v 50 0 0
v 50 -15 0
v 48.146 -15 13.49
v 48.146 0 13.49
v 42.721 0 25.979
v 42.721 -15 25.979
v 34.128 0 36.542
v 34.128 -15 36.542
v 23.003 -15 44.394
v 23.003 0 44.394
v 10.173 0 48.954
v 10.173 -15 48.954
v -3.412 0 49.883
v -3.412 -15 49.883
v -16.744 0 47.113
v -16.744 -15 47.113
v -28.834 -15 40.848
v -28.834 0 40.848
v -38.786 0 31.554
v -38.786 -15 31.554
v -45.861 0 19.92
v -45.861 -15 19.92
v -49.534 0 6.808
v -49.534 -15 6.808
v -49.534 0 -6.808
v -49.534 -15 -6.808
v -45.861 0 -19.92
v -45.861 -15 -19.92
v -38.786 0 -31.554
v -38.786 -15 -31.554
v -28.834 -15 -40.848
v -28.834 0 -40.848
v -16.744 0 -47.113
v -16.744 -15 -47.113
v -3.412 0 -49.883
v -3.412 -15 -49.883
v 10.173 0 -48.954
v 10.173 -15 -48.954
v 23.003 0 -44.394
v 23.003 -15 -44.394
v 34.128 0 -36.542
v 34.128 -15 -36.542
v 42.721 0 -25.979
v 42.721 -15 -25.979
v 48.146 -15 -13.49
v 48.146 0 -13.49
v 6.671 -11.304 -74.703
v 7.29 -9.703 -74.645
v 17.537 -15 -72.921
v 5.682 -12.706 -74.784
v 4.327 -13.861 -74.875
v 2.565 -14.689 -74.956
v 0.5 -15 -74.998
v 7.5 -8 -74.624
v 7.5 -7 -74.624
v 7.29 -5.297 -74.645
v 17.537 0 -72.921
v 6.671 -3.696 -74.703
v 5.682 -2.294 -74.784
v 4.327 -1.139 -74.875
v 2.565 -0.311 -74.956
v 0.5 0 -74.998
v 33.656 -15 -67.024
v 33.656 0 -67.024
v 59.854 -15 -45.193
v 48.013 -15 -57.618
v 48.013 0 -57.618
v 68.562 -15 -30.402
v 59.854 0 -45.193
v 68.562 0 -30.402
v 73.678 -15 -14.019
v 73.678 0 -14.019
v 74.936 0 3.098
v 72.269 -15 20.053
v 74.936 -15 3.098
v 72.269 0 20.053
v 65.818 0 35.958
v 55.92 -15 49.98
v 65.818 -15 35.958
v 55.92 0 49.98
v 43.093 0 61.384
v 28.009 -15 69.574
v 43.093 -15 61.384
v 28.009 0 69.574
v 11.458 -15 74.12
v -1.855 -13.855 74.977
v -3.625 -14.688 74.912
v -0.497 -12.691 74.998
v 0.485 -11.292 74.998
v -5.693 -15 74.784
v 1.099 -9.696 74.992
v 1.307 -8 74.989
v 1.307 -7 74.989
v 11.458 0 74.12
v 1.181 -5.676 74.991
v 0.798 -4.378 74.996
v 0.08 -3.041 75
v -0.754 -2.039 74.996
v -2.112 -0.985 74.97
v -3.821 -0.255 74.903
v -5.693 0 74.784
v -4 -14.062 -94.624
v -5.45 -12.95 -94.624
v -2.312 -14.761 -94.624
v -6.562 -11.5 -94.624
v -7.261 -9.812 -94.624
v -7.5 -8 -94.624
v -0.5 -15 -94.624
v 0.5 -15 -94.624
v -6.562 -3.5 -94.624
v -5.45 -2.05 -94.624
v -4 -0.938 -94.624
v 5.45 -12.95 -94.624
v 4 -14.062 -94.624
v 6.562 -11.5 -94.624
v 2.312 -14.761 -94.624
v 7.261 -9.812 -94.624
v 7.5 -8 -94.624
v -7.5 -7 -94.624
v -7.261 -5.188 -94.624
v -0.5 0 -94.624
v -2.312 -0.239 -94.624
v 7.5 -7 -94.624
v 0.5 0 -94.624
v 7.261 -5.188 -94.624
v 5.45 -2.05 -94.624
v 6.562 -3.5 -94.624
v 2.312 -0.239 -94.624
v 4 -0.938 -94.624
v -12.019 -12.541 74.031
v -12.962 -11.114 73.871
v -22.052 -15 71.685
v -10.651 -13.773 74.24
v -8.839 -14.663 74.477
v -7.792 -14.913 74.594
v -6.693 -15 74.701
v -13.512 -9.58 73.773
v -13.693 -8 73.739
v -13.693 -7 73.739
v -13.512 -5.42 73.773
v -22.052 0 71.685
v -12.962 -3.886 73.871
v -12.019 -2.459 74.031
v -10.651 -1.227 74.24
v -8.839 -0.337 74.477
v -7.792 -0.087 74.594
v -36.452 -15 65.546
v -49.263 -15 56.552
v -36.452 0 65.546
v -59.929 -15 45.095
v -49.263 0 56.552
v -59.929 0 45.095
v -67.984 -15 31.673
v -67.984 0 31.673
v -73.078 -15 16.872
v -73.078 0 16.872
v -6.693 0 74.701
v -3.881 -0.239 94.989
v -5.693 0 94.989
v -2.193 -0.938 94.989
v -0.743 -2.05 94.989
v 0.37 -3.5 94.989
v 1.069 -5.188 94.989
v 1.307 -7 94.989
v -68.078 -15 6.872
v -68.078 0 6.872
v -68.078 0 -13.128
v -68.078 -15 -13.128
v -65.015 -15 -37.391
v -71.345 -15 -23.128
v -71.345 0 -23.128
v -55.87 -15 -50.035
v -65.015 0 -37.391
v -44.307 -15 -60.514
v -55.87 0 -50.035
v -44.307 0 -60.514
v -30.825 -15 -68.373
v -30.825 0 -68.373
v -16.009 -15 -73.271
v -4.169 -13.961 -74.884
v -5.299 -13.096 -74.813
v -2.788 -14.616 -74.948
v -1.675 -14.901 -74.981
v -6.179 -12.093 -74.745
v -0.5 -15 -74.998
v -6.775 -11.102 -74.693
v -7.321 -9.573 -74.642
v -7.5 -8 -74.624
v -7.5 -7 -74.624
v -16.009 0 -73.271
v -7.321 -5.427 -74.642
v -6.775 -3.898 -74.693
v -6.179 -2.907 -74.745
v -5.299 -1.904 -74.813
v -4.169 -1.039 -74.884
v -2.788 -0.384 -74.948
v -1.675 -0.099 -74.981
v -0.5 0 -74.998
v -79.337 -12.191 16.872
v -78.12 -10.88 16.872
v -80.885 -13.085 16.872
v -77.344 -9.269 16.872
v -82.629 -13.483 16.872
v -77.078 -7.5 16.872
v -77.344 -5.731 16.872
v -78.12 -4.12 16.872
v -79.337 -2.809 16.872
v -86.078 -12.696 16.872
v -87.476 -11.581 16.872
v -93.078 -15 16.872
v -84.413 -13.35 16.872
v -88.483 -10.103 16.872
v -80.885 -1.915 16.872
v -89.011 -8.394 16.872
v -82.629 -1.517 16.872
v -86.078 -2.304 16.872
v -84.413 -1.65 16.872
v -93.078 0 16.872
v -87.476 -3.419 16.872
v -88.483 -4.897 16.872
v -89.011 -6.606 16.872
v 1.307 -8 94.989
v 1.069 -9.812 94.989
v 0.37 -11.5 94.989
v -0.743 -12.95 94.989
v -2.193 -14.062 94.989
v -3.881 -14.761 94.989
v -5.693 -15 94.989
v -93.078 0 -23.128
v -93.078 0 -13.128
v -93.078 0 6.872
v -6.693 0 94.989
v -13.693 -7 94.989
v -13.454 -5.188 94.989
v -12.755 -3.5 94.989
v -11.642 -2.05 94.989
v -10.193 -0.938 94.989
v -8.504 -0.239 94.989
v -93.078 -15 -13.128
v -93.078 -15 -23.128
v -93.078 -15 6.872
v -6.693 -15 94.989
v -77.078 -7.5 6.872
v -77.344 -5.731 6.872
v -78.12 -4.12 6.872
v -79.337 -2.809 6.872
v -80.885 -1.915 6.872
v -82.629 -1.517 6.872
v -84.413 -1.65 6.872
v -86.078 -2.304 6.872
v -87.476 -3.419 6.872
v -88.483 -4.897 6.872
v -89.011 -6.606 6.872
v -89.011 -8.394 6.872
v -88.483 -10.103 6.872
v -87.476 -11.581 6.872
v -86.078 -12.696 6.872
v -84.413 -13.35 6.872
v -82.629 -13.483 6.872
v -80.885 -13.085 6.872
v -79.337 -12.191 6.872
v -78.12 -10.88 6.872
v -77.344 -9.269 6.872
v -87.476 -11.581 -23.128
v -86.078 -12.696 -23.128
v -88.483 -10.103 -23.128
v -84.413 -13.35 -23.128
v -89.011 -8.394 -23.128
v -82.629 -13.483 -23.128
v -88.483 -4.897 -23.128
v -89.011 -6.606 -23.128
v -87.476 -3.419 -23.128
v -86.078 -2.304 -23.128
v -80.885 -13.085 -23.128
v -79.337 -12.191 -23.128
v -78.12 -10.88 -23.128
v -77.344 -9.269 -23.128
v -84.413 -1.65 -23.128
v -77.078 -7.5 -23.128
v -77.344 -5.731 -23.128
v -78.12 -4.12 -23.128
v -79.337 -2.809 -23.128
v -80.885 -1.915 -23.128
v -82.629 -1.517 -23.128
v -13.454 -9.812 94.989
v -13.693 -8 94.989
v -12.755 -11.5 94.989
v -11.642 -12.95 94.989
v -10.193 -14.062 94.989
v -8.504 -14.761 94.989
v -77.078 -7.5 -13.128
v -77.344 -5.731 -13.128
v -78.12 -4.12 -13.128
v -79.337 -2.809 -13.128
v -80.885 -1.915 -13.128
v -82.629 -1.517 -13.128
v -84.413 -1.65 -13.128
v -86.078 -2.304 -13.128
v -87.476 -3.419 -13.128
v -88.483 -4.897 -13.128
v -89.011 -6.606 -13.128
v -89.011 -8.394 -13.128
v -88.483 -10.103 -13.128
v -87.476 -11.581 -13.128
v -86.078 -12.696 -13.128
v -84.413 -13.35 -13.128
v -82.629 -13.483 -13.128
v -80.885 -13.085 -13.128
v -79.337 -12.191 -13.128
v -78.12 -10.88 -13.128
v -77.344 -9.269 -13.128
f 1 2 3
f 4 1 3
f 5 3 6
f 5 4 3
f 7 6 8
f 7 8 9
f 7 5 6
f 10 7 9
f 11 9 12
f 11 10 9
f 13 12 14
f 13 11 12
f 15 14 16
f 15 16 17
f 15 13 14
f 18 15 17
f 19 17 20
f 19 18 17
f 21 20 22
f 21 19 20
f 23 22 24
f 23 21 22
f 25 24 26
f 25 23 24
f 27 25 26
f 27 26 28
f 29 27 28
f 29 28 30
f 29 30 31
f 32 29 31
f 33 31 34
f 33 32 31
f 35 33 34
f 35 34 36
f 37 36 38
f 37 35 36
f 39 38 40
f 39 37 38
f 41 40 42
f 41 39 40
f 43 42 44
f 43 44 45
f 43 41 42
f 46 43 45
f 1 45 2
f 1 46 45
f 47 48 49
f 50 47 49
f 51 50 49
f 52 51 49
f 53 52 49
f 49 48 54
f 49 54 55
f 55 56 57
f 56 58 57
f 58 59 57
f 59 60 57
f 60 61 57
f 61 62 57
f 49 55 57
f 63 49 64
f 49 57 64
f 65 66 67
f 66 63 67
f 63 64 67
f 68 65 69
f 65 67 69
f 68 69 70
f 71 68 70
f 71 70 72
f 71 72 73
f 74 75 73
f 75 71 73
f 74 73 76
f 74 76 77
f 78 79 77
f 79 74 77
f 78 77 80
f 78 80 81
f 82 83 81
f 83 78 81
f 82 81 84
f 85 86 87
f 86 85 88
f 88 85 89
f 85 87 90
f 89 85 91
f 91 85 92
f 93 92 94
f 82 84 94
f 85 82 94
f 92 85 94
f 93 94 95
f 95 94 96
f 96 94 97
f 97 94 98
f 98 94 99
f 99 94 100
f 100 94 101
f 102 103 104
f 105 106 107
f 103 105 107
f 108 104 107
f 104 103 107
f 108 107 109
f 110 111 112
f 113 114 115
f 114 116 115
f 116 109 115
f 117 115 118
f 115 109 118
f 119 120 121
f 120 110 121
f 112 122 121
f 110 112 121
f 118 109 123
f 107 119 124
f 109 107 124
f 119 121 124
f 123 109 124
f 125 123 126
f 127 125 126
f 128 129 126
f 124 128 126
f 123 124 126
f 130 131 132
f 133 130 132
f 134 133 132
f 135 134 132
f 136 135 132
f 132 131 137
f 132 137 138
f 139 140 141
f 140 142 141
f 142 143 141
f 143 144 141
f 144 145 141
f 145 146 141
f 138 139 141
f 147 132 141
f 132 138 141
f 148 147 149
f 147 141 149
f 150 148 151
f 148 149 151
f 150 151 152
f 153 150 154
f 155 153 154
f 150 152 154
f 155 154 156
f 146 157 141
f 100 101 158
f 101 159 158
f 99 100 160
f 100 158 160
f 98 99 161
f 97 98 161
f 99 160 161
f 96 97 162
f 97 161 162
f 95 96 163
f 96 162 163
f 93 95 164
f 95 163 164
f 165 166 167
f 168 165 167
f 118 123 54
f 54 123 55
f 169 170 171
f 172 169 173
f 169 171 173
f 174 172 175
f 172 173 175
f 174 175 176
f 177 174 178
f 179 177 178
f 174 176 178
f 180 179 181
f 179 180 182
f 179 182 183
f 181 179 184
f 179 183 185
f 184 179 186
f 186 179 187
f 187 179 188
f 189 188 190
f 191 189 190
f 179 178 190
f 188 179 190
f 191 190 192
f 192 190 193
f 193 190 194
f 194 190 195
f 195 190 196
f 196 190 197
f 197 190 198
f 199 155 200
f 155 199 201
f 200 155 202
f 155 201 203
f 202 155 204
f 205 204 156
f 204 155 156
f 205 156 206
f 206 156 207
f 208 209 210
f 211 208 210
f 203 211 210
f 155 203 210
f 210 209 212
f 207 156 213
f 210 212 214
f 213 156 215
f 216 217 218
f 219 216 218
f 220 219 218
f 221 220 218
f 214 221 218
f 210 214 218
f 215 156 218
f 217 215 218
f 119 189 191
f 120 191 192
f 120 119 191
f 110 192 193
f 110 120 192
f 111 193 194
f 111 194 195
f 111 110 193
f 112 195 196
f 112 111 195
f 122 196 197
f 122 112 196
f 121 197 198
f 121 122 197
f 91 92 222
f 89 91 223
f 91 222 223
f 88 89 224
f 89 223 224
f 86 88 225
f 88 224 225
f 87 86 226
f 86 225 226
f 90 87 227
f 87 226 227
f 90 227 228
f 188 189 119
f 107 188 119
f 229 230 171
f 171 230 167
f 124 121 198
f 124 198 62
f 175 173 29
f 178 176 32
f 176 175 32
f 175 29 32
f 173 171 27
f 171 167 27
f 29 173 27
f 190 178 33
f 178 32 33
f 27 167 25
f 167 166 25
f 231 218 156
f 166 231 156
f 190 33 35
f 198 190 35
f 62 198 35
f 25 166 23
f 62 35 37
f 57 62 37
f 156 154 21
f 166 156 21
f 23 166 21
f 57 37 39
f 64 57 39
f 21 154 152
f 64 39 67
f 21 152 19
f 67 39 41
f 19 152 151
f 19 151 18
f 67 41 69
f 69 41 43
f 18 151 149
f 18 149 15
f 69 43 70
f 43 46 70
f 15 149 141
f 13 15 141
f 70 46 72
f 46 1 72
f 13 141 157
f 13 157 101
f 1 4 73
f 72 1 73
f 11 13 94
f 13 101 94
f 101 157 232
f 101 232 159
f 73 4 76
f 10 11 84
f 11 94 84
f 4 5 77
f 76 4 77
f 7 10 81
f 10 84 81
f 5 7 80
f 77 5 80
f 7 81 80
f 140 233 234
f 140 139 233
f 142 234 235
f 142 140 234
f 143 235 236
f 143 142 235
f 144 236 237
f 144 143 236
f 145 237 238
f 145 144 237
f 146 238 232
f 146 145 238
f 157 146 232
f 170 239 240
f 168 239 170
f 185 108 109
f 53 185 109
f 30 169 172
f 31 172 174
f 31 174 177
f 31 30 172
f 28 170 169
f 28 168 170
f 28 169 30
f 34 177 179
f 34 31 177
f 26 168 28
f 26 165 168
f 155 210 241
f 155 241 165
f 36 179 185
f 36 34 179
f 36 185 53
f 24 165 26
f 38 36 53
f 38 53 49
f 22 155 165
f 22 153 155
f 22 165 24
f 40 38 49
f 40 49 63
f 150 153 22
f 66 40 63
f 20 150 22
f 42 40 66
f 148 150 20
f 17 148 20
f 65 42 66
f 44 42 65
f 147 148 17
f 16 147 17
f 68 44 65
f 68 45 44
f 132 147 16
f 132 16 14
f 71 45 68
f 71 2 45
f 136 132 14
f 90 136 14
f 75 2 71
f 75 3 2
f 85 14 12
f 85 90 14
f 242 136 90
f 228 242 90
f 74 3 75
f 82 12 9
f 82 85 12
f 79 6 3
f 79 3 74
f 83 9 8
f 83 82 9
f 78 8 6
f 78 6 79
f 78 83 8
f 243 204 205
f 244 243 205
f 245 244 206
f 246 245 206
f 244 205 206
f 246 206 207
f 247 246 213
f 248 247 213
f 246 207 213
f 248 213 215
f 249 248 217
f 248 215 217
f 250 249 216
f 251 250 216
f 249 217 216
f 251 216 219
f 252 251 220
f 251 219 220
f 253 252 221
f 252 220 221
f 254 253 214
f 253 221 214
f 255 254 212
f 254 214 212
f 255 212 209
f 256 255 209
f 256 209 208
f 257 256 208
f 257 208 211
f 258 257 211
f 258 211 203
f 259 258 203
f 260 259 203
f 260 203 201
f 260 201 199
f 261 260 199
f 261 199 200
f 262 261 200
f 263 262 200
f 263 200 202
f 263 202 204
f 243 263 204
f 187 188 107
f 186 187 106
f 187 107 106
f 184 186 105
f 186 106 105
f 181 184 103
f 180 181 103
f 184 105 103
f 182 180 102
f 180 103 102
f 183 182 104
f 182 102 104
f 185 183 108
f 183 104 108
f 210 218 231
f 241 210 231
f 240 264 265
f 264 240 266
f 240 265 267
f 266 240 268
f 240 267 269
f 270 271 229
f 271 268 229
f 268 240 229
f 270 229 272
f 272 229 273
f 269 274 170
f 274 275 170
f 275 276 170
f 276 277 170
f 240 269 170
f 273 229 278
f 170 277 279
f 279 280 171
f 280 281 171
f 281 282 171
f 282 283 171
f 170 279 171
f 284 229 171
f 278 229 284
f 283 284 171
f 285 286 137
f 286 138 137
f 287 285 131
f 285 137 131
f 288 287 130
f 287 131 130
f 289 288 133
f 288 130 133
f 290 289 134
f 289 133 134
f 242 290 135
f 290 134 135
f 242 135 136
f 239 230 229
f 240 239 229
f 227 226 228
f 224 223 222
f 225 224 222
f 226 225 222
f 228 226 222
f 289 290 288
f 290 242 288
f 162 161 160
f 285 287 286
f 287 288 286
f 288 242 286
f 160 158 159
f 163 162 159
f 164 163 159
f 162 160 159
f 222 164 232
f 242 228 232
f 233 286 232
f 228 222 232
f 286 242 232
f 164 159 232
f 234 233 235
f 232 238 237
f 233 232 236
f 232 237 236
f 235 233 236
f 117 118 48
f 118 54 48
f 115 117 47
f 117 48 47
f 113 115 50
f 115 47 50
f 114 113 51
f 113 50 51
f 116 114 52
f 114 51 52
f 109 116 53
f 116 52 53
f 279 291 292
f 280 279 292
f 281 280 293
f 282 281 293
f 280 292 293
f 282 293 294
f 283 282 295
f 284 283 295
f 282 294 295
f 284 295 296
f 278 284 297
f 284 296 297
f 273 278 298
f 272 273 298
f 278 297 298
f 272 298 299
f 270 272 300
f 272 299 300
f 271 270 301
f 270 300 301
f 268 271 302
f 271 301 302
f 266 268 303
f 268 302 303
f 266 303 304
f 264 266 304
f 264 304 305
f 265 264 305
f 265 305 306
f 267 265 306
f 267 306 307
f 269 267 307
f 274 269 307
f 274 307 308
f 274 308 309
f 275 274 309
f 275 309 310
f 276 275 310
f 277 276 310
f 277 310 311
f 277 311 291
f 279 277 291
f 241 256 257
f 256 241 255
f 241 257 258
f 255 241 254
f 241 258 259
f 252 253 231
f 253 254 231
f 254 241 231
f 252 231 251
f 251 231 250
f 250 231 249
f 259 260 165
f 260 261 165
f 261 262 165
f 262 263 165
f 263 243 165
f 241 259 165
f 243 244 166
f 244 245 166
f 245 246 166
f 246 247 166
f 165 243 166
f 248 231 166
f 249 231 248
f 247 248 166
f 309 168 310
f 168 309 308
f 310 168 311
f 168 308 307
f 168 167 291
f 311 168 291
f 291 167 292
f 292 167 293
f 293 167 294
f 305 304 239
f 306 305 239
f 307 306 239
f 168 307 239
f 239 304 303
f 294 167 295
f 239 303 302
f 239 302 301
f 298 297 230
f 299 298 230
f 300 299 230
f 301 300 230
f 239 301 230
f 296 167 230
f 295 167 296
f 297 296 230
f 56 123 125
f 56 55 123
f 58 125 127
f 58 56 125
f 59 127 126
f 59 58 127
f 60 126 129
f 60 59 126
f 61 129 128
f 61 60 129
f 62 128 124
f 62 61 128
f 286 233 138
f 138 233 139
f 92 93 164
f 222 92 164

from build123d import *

# Parameters (mm, degrees)
F0_R     = 50
F1_DEPTH = 15
F2_R     = 7
F3_R     = 7
F5_DEPTH = 42.6


with BuildPart() as f1:
    # F0 (on Front) → F1 (new body)
    with BuildSketch(Plane.XZ):
        with BuildLine():
            Line((-13.692577, 94.988603), (-13.692577, 73.739497))
            ThreePointArc((-13.692577, 73.739497), (-51.872276, 54.168874), (-73.077535, 16.872283))
            Line((-73.077535, 16.872283), (-93.077535, 16.872283))
            Line((-93.077535, 16.872283), (-93.077535, 6.872283))
            Line((-93.077535, 6.872283), (-68.077535, 6.872283))
            Line((-68.077535, 6.872283), (-68.077535, -13.127717))
            Line((-68.077535, -13.127717), (-93.077535, -13.127717))
            Line((-93.077535, -13.127717), (-93.077535, -23.127717))
            Line((-93.077535, -23.127717), (-71.344998, -23.127717))
            ThreePointArc((-71.344998, -23.127717), (-47.086109, -58.377207), (-7.5, -74.624058))
            Line((-7.5, -74.624058), (-7.5, -94.624058))
            Line((-7.5, -94.624058), (0, -94.624058))
            Line((0, -94.624058), (7.5, -94.624058))
            Line((7.5, -94.624058), (7.5, -74.624058))
            ThreePointArc((7.5, -74.624058), (74.935838, 3.101649), (1.307423, 74.988603))
            Line((1.307423, 74.988603), (1.307423, 94.988603))
            Line((1.307423, 94.988603), (-6.192577, 94.988603))
            Line((-6.192577, 94.988603), (-13.692577, 94.988603))
        make_face()
        Circle(F0_R, mode=Mode.SUBTRACT)
    extrude(amount=F1_DEPTH)

    # F2
    f2_edges = [f1.edges().sort_by_distance(p)[0] for p in [
        (-7.5, -15, -84.624058),
        (7.5, -15, -84.624058),
        (7.5, 0, -84.624058),
        (-7.5, 0, -84.624058),
    ]]
    fillet(f2_edges, radius=F2_R)

    # F3
    f3_edges = [f1.edges().sort_by_distance(p)[0] for p in [
        (1.307423, -15, 84.988603),
        (1.307423, 0, 84.988603),
        (-13.692577, -15, 84.36405),
        (-13.692577, 0, 84.36405),
    ]]
    fillet(f3_edges, radius=F3_R)

    # F4 (on face) → F5 (cut)
    with BuildSketch(Plane.XY.offset(16.872283)):
        with BuildLine():
            ThreePointArc((-89.077535, -7.5), (-83.077535, -13.5), (-77.077535, -7.5))
            ThreePointArc((-77.077535, -7.5), (-83.077535, -1.5), (-89.077535, -7.5))
        make_face()
    extrude(amount=-F5_DEPTH, mode=Mode.SUBTRACT)


solid = f1.part
